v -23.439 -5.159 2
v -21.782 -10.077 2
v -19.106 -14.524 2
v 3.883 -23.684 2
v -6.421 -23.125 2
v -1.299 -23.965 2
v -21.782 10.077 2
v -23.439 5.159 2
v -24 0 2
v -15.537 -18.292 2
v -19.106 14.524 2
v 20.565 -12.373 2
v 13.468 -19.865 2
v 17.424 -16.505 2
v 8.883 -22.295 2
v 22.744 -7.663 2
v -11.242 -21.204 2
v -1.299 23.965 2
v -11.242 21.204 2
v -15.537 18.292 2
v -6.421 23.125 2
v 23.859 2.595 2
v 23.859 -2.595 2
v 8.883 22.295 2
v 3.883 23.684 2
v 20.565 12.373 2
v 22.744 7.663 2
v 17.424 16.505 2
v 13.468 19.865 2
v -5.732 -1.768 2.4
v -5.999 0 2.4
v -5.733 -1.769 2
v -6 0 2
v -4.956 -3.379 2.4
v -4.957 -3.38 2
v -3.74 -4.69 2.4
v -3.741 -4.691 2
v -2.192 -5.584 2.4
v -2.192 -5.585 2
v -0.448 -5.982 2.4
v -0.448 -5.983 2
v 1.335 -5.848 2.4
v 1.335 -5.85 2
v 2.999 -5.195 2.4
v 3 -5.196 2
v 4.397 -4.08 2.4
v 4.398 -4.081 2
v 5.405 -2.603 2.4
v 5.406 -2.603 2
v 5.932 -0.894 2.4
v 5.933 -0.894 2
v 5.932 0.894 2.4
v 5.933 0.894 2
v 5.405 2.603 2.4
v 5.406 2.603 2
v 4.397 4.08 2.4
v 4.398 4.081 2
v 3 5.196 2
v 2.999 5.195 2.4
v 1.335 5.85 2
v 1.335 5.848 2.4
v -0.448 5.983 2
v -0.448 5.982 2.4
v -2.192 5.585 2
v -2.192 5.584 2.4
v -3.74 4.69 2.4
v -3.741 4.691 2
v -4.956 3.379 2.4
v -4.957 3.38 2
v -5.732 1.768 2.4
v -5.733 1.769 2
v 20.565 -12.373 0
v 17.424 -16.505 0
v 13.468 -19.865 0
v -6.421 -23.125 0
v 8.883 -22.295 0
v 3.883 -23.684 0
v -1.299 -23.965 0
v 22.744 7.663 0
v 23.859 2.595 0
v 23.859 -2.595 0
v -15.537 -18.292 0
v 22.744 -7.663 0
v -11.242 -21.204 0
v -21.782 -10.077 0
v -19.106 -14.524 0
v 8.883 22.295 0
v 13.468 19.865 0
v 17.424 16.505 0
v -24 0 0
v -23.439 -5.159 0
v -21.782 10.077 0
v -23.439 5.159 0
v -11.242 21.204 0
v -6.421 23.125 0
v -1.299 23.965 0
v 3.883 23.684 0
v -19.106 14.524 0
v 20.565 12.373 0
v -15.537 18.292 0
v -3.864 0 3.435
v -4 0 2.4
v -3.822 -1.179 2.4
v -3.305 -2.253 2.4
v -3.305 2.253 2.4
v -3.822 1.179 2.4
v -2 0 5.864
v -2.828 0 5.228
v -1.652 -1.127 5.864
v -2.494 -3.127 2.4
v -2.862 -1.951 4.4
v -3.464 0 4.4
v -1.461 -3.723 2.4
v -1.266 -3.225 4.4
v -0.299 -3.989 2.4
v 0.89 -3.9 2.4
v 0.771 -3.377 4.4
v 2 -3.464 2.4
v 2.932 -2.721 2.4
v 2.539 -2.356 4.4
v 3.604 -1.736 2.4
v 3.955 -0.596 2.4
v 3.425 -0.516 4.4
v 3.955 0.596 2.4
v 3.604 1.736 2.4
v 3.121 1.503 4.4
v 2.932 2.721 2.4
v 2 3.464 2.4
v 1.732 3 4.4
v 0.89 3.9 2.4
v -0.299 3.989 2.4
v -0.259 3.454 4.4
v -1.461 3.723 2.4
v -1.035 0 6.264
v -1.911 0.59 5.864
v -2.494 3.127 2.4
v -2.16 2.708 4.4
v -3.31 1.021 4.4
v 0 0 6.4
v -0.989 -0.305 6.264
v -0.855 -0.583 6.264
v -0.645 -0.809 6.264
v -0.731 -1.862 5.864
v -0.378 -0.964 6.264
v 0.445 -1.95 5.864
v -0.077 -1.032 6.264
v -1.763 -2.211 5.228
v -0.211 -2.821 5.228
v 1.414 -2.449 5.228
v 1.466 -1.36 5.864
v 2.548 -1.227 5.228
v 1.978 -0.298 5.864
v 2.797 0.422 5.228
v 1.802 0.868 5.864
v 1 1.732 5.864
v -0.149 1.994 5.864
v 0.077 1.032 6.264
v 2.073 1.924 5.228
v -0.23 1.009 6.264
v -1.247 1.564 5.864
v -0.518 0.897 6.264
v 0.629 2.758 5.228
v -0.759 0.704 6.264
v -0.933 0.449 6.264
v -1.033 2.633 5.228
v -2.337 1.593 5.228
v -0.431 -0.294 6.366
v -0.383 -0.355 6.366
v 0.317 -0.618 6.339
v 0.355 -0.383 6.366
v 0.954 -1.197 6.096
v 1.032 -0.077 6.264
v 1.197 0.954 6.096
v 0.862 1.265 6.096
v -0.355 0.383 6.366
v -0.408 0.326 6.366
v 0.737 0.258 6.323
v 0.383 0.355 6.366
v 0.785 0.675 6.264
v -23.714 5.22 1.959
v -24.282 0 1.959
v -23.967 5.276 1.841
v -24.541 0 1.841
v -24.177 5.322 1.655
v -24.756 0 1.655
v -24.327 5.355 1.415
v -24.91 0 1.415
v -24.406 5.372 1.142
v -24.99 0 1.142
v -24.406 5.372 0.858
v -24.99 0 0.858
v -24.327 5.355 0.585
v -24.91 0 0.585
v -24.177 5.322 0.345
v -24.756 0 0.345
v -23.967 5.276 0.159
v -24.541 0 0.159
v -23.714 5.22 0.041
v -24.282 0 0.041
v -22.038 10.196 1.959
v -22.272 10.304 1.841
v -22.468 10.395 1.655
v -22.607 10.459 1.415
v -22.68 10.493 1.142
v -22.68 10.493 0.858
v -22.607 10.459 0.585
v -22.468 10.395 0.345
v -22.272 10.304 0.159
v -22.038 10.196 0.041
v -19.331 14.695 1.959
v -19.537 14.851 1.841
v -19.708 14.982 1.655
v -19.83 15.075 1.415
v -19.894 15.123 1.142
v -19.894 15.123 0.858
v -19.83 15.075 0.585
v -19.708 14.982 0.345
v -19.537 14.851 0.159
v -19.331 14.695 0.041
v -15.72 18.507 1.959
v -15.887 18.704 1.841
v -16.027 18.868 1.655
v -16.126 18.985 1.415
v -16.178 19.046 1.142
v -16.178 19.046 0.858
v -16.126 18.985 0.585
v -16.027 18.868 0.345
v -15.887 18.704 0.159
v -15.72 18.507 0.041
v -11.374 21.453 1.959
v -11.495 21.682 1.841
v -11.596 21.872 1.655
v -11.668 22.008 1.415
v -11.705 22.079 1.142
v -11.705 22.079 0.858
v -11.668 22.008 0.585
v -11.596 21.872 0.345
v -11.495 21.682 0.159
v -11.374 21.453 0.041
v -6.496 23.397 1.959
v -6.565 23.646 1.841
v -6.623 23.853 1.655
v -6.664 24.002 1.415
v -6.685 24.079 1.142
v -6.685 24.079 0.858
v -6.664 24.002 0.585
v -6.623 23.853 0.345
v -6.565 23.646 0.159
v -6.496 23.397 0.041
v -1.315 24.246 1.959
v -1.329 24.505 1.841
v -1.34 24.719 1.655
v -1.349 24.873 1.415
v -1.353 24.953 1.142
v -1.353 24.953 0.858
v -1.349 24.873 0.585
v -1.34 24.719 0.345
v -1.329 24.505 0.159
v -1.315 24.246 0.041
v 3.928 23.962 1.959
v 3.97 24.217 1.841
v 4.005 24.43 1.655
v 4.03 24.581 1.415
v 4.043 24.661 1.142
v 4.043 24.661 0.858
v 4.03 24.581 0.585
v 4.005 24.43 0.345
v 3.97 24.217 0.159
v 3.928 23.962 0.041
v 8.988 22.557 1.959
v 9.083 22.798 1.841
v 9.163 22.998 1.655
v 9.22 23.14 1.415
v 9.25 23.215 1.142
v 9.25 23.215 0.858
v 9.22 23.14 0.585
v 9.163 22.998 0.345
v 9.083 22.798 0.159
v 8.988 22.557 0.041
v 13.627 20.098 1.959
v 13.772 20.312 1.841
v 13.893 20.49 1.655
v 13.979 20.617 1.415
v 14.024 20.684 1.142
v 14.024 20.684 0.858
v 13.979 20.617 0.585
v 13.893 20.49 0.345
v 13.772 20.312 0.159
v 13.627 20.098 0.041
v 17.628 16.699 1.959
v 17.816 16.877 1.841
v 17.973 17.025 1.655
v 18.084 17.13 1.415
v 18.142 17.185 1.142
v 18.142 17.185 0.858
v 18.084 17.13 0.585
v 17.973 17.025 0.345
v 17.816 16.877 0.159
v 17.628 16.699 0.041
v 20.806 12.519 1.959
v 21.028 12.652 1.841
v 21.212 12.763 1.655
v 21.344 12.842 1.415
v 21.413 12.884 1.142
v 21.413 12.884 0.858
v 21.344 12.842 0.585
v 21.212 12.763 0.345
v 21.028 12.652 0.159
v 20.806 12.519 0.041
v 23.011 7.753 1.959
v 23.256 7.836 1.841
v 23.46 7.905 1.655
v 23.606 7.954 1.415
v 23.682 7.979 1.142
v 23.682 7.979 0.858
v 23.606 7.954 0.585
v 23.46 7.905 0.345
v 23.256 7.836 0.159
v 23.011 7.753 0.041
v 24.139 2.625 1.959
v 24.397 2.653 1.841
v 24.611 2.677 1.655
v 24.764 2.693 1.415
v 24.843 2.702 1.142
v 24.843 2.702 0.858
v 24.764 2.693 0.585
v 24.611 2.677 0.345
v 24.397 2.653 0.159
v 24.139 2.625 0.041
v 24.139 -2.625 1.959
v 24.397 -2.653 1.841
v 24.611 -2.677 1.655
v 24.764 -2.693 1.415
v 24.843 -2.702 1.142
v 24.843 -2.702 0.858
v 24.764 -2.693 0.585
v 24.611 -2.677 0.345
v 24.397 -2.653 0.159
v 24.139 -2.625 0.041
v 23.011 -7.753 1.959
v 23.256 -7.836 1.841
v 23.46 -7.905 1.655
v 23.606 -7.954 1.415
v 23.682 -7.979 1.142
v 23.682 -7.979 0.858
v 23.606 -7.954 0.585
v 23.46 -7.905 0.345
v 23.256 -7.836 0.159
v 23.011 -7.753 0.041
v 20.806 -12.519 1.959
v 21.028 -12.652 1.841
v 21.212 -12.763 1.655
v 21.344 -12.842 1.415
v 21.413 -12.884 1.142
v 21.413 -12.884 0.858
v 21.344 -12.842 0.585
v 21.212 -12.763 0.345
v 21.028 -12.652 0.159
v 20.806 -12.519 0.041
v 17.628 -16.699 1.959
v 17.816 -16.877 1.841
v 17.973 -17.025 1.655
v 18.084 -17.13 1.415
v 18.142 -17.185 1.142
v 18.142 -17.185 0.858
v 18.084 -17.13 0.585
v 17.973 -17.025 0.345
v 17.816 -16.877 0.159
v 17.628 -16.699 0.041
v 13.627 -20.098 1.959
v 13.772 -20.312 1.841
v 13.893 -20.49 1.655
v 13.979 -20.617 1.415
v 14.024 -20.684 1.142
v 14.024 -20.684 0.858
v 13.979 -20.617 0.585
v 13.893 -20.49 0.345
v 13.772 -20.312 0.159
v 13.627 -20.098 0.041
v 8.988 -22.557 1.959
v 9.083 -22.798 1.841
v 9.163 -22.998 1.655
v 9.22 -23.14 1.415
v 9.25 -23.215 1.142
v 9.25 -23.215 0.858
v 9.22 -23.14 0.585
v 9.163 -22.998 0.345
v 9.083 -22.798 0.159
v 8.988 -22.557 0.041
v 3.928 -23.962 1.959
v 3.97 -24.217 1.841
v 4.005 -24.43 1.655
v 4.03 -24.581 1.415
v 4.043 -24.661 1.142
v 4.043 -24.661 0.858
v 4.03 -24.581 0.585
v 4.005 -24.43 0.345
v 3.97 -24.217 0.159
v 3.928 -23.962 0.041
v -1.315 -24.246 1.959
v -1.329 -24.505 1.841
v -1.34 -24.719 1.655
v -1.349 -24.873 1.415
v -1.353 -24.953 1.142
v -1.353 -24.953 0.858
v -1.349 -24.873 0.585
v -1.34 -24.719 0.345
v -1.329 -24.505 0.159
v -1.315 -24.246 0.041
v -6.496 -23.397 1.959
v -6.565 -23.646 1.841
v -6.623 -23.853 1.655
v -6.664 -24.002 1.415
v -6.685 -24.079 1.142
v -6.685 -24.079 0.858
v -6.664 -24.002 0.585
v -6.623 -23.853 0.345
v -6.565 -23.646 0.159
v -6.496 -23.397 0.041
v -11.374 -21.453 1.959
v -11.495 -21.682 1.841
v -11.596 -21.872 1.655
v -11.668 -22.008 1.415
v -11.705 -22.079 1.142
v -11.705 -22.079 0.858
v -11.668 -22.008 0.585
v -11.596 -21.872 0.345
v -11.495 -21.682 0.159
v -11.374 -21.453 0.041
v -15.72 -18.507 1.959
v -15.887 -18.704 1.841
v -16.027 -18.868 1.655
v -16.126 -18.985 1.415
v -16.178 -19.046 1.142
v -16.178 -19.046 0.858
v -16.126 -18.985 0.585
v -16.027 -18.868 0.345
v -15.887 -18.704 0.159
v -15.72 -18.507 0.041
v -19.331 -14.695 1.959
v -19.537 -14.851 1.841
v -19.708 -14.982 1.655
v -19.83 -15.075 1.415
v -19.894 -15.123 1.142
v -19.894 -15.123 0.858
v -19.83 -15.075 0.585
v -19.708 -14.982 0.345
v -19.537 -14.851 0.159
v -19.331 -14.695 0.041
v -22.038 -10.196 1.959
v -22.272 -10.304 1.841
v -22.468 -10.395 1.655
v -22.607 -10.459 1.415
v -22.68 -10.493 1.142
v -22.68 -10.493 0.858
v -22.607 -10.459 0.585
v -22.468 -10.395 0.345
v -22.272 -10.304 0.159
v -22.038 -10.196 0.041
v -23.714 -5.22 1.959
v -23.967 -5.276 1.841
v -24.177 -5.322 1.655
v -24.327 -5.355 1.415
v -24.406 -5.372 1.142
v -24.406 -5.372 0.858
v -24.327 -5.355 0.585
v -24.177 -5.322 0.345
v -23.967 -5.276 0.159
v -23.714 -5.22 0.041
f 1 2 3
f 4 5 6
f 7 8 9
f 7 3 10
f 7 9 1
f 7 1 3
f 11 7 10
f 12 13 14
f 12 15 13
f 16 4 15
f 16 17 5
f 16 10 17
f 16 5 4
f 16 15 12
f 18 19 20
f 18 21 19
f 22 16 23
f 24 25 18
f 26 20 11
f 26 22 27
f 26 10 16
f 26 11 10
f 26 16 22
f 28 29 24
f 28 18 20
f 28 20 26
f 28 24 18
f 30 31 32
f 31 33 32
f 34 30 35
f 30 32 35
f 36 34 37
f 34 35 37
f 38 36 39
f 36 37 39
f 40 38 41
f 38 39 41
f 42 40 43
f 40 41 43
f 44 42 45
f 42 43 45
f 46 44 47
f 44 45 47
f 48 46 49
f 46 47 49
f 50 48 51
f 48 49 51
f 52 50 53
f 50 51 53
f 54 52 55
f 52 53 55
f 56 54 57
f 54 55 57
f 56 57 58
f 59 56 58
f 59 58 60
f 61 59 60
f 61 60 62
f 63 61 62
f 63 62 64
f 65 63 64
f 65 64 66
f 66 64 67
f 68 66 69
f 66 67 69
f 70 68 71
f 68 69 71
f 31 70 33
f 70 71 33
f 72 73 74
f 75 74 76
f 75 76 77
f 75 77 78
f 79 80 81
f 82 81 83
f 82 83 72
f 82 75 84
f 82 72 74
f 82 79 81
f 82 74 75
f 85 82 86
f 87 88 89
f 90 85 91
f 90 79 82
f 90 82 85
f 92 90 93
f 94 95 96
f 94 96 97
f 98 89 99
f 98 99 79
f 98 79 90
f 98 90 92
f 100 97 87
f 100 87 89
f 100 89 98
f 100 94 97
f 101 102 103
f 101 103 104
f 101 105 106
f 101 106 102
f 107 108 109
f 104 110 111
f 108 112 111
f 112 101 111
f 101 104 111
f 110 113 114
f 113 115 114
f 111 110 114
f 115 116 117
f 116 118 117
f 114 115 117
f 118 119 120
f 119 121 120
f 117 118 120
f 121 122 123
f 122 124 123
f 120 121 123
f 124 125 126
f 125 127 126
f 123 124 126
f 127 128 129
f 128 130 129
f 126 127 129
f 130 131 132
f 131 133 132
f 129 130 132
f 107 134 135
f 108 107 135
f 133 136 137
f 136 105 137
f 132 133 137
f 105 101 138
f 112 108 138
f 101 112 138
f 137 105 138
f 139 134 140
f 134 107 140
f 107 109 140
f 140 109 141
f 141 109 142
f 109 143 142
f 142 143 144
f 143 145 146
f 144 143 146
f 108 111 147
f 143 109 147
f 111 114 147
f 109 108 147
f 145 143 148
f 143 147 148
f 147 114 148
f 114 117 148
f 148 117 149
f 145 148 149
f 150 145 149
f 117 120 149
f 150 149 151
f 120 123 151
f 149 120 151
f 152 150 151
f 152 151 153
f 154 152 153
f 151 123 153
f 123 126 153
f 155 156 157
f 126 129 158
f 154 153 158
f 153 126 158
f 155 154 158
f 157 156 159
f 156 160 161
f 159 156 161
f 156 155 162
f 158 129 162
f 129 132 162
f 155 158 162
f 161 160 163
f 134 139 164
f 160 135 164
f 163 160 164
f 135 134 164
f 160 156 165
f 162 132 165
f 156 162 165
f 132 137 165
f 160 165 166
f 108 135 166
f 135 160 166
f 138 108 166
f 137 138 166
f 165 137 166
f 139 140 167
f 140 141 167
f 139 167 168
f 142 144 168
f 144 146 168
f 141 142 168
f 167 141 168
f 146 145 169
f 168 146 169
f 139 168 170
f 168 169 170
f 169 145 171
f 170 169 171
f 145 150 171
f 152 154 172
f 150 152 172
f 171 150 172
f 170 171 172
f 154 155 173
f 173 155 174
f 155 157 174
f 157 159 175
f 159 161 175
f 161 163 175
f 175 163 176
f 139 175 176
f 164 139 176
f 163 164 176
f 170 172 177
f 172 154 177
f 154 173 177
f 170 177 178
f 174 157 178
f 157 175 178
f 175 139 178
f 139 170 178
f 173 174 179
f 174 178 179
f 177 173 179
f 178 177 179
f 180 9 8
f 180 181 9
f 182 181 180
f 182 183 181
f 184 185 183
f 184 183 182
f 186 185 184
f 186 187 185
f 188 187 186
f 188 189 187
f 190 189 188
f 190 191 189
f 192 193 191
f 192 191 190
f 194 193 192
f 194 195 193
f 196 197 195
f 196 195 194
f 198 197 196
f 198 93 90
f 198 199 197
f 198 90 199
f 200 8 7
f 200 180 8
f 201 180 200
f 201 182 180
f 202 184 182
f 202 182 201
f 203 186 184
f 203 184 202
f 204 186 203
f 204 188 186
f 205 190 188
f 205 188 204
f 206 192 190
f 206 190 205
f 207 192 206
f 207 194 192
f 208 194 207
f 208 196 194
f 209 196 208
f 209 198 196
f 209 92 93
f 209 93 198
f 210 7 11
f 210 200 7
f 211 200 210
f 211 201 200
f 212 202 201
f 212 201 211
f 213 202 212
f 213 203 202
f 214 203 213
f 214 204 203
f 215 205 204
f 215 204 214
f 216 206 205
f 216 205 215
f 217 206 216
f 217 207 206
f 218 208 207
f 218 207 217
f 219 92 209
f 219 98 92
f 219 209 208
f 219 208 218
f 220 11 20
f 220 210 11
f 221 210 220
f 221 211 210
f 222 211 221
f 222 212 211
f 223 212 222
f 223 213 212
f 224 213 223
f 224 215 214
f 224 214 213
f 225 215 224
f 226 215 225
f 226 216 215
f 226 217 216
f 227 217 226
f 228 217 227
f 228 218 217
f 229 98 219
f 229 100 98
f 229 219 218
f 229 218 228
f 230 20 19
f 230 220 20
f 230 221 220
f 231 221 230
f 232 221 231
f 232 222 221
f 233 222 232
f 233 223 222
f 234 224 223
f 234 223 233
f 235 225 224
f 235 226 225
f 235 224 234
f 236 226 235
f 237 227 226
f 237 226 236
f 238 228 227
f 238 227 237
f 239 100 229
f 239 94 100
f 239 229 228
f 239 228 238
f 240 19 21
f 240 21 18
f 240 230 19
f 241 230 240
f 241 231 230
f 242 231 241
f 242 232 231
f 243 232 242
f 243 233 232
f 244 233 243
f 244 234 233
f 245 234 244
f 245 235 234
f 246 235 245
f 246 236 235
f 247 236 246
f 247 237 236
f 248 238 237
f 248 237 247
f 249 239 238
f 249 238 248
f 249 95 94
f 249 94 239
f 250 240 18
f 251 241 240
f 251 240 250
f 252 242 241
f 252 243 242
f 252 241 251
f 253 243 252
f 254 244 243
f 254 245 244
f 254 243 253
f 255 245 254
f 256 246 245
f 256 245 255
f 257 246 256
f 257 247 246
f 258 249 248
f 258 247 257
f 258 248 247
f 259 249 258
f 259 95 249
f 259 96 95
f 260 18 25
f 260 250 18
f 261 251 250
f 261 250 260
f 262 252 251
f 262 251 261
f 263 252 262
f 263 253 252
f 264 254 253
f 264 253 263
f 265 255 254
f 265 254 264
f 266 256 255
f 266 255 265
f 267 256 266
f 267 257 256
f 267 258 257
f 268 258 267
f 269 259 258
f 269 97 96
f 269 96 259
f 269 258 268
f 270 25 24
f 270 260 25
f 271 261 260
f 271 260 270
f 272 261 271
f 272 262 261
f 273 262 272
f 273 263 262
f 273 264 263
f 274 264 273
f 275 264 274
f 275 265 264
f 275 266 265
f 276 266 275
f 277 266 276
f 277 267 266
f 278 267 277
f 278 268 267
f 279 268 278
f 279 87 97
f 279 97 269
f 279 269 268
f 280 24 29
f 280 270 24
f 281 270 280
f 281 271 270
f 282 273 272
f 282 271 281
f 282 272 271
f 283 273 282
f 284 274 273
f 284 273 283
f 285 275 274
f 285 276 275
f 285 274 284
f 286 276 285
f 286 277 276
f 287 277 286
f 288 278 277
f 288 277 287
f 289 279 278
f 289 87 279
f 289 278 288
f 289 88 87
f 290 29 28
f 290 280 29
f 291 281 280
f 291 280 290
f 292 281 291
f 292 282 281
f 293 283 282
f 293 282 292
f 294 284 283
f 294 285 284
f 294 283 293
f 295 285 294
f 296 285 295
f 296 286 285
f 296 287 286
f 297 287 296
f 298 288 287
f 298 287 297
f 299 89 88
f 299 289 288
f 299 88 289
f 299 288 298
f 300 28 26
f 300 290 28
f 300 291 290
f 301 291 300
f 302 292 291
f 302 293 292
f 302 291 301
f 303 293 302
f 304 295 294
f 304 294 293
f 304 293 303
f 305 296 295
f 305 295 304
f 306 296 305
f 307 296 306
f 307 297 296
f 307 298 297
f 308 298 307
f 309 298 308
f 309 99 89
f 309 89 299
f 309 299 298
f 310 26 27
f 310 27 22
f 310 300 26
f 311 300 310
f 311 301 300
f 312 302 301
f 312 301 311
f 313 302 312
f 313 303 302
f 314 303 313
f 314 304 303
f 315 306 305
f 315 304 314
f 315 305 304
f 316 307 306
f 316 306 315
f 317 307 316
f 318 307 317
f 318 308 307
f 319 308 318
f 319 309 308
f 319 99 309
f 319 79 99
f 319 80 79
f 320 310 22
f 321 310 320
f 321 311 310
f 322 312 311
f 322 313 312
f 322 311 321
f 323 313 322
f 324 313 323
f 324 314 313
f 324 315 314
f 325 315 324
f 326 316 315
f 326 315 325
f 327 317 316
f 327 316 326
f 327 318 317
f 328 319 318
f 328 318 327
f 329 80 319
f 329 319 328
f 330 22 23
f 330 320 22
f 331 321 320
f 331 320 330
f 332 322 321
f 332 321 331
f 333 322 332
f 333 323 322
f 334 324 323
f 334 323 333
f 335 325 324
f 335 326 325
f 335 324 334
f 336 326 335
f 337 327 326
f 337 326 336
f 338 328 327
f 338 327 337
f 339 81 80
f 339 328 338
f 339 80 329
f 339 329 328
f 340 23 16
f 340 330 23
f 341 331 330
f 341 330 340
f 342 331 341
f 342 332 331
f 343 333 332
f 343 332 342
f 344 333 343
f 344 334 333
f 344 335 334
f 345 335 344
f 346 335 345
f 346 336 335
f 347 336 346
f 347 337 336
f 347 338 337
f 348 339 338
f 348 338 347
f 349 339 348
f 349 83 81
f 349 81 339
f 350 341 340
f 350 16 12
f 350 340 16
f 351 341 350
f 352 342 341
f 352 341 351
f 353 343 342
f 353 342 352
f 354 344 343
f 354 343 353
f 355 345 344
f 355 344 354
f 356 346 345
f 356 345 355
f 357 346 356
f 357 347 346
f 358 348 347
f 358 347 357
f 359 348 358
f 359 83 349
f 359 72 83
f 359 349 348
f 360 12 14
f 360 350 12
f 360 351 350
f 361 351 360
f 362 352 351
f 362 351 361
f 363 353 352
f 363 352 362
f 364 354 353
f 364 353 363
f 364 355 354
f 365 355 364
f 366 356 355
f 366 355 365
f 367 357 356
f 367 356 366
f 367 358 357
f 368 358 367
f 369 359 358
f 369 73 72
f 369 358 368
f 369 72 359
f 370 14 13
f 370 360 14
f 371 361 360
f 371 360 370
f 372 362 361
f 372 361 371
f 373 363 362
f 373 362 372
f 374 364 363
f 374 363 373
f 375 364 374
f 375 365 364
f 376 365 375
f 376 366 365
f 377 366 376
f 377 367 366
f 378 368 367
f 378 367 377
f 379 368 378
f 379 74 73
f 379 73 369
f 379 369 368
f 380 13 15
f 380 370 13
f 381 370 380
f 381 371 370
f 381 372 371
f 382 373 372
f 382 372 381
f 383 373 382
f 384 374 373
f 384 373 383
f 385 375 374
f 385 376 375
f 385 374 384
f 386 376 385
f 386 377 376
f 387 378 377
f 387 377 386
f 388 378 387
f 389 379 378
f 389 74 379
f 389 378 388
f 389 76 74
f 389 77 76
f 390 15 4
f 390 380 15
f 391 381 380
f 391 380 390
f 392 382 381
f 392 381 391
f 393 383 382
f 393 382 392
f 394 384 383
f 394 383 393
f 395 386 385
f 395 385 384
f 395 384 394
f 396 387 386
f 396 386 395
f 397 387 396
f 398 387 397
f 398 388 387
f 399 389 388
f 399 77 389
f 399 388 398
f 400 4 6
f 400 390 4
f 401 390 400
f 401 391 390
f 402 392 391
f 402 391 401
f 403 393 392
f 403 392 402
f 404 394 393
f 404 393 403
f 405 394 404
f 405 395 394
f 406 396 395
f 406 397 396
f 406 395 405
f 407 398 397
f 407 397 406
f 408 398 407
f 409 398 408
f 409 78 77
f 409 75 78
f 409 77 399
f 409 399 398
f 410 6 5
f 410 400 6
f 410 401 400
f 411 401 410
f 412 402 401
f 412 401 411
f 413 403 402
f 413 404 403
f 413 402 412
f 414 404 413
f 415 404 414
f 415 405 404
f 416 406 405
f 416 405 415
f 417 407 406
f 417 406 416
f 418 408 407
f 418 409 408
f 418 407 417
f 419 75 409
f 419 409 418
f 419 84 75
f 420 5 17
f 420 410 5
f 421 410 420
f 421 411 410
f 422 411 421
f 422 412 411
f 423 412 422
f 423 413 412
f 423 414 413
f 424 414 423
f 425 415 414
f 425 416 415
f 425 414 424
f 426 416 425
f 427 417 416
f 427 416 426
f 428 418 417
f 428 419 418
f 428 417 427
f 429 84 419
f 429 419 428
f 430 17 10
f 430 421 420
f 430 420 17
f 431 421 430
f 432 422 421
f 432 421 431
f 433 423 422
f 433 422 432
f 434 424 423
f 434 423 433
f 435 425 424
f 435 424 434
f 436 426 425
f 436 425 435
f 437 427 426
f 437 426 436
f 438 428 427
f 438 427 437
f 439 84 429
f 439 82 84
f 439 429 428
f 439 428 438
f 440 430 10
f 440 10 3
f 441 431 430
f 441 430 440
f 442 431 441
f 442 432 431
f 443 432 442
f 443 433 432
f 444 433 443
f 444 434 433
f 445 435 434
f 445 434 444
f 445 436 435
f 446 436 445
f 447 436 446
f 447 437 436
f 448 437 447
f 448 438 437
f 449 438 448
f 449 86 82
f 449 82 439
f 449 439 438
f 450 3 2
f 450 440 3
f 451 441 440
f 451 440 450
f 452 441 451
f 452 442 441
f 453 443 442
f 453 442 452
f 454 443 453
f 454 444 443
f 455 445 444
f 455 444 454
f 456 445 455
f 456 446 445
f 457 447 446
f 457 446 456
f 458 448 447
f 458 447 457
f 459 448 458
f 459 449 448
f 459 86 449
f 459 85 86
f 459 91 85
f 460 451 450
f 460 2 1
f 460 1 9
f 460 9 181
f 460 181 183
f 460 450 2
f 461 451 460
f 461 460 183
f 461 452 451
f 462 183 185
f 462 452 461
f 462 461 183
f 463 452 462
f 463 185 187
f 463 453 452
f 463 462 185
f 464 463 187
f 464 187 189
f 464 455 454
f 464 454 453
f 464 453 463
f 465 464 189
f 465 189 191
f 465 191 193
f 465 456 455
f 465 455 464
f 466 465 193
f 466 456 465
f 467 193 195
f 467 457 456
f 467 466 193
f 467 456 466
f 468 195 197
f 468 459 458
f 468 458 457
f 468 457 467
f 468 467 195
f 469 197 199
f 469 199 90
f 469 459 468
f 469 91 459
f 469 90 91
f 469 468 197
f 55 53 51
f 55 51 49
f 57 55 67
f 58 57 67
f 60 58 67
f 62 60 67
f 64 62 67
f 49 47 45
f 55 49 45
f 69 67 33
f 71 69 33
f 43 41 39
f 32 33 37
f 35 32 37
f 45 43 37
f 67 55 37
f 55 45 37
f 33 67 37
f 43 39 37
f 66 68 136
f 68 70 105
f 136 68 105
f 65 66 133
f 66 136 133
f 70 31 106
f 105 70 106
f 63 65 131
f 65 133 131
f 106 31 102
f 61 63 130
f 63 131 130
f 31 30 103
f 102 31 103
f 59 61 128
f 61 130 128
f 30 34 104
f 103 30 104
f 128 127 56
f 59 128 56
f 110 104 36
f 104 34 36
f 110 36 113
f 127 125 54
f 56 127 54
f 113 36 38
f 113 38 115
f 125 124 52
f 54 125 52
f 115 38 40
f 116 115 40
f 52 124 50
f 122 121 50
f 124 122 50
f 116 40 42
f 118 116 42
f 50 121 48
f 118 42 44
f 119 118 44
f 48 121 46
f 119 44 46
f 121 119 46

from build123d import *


# Not quite as in the source:
# - ends of sketch curves that miss each other by under 0.0002 mm in the source are joined
# - a feature names something its author has since deleted; it is built from what else it names


with BuildPart() as f1:
    # F0 (on Front) → F1 (revolve)
    with BuildSketch(Plane.XZ):
        with BuildLine():
            Line((0, 2), (-24, 2))
            ThreePointArc((-24, 2), (-25, 1), (-24, 0))
            Line((-24, 0), (0, 0))
            Line((0, 0), (0, 2))
        make_face()
    revolve(axis=Axis((0, 0, 1), (0, 0, -1)))


with BuildPart() as f3:
    # F2 (on Front) → F3 (revolve)
    with BuildSketch(Plane.XZ):
        with BuildLine():
            Line((0, 2.3999979427), (0, 6.4))
            ThreePointArc((0, 6.4), (-2.8284271247, 5.2284250674), (-4, 2.3999979427))
            Line((-4, 2.3999979427), (-5.9987170854, 2.3999979427))
            Line((-5.9987170854, 2.3999979427), (-6, 2))
            Line((-6, 2), (0, 2))
            Line((0, 2), (0, 2.3999979427))
        make_face()
    revolve(axis=Axis((0, 0, 4.3999989713), (0, 0, 1)))


solid = Compound([f1.part, f3.part])
